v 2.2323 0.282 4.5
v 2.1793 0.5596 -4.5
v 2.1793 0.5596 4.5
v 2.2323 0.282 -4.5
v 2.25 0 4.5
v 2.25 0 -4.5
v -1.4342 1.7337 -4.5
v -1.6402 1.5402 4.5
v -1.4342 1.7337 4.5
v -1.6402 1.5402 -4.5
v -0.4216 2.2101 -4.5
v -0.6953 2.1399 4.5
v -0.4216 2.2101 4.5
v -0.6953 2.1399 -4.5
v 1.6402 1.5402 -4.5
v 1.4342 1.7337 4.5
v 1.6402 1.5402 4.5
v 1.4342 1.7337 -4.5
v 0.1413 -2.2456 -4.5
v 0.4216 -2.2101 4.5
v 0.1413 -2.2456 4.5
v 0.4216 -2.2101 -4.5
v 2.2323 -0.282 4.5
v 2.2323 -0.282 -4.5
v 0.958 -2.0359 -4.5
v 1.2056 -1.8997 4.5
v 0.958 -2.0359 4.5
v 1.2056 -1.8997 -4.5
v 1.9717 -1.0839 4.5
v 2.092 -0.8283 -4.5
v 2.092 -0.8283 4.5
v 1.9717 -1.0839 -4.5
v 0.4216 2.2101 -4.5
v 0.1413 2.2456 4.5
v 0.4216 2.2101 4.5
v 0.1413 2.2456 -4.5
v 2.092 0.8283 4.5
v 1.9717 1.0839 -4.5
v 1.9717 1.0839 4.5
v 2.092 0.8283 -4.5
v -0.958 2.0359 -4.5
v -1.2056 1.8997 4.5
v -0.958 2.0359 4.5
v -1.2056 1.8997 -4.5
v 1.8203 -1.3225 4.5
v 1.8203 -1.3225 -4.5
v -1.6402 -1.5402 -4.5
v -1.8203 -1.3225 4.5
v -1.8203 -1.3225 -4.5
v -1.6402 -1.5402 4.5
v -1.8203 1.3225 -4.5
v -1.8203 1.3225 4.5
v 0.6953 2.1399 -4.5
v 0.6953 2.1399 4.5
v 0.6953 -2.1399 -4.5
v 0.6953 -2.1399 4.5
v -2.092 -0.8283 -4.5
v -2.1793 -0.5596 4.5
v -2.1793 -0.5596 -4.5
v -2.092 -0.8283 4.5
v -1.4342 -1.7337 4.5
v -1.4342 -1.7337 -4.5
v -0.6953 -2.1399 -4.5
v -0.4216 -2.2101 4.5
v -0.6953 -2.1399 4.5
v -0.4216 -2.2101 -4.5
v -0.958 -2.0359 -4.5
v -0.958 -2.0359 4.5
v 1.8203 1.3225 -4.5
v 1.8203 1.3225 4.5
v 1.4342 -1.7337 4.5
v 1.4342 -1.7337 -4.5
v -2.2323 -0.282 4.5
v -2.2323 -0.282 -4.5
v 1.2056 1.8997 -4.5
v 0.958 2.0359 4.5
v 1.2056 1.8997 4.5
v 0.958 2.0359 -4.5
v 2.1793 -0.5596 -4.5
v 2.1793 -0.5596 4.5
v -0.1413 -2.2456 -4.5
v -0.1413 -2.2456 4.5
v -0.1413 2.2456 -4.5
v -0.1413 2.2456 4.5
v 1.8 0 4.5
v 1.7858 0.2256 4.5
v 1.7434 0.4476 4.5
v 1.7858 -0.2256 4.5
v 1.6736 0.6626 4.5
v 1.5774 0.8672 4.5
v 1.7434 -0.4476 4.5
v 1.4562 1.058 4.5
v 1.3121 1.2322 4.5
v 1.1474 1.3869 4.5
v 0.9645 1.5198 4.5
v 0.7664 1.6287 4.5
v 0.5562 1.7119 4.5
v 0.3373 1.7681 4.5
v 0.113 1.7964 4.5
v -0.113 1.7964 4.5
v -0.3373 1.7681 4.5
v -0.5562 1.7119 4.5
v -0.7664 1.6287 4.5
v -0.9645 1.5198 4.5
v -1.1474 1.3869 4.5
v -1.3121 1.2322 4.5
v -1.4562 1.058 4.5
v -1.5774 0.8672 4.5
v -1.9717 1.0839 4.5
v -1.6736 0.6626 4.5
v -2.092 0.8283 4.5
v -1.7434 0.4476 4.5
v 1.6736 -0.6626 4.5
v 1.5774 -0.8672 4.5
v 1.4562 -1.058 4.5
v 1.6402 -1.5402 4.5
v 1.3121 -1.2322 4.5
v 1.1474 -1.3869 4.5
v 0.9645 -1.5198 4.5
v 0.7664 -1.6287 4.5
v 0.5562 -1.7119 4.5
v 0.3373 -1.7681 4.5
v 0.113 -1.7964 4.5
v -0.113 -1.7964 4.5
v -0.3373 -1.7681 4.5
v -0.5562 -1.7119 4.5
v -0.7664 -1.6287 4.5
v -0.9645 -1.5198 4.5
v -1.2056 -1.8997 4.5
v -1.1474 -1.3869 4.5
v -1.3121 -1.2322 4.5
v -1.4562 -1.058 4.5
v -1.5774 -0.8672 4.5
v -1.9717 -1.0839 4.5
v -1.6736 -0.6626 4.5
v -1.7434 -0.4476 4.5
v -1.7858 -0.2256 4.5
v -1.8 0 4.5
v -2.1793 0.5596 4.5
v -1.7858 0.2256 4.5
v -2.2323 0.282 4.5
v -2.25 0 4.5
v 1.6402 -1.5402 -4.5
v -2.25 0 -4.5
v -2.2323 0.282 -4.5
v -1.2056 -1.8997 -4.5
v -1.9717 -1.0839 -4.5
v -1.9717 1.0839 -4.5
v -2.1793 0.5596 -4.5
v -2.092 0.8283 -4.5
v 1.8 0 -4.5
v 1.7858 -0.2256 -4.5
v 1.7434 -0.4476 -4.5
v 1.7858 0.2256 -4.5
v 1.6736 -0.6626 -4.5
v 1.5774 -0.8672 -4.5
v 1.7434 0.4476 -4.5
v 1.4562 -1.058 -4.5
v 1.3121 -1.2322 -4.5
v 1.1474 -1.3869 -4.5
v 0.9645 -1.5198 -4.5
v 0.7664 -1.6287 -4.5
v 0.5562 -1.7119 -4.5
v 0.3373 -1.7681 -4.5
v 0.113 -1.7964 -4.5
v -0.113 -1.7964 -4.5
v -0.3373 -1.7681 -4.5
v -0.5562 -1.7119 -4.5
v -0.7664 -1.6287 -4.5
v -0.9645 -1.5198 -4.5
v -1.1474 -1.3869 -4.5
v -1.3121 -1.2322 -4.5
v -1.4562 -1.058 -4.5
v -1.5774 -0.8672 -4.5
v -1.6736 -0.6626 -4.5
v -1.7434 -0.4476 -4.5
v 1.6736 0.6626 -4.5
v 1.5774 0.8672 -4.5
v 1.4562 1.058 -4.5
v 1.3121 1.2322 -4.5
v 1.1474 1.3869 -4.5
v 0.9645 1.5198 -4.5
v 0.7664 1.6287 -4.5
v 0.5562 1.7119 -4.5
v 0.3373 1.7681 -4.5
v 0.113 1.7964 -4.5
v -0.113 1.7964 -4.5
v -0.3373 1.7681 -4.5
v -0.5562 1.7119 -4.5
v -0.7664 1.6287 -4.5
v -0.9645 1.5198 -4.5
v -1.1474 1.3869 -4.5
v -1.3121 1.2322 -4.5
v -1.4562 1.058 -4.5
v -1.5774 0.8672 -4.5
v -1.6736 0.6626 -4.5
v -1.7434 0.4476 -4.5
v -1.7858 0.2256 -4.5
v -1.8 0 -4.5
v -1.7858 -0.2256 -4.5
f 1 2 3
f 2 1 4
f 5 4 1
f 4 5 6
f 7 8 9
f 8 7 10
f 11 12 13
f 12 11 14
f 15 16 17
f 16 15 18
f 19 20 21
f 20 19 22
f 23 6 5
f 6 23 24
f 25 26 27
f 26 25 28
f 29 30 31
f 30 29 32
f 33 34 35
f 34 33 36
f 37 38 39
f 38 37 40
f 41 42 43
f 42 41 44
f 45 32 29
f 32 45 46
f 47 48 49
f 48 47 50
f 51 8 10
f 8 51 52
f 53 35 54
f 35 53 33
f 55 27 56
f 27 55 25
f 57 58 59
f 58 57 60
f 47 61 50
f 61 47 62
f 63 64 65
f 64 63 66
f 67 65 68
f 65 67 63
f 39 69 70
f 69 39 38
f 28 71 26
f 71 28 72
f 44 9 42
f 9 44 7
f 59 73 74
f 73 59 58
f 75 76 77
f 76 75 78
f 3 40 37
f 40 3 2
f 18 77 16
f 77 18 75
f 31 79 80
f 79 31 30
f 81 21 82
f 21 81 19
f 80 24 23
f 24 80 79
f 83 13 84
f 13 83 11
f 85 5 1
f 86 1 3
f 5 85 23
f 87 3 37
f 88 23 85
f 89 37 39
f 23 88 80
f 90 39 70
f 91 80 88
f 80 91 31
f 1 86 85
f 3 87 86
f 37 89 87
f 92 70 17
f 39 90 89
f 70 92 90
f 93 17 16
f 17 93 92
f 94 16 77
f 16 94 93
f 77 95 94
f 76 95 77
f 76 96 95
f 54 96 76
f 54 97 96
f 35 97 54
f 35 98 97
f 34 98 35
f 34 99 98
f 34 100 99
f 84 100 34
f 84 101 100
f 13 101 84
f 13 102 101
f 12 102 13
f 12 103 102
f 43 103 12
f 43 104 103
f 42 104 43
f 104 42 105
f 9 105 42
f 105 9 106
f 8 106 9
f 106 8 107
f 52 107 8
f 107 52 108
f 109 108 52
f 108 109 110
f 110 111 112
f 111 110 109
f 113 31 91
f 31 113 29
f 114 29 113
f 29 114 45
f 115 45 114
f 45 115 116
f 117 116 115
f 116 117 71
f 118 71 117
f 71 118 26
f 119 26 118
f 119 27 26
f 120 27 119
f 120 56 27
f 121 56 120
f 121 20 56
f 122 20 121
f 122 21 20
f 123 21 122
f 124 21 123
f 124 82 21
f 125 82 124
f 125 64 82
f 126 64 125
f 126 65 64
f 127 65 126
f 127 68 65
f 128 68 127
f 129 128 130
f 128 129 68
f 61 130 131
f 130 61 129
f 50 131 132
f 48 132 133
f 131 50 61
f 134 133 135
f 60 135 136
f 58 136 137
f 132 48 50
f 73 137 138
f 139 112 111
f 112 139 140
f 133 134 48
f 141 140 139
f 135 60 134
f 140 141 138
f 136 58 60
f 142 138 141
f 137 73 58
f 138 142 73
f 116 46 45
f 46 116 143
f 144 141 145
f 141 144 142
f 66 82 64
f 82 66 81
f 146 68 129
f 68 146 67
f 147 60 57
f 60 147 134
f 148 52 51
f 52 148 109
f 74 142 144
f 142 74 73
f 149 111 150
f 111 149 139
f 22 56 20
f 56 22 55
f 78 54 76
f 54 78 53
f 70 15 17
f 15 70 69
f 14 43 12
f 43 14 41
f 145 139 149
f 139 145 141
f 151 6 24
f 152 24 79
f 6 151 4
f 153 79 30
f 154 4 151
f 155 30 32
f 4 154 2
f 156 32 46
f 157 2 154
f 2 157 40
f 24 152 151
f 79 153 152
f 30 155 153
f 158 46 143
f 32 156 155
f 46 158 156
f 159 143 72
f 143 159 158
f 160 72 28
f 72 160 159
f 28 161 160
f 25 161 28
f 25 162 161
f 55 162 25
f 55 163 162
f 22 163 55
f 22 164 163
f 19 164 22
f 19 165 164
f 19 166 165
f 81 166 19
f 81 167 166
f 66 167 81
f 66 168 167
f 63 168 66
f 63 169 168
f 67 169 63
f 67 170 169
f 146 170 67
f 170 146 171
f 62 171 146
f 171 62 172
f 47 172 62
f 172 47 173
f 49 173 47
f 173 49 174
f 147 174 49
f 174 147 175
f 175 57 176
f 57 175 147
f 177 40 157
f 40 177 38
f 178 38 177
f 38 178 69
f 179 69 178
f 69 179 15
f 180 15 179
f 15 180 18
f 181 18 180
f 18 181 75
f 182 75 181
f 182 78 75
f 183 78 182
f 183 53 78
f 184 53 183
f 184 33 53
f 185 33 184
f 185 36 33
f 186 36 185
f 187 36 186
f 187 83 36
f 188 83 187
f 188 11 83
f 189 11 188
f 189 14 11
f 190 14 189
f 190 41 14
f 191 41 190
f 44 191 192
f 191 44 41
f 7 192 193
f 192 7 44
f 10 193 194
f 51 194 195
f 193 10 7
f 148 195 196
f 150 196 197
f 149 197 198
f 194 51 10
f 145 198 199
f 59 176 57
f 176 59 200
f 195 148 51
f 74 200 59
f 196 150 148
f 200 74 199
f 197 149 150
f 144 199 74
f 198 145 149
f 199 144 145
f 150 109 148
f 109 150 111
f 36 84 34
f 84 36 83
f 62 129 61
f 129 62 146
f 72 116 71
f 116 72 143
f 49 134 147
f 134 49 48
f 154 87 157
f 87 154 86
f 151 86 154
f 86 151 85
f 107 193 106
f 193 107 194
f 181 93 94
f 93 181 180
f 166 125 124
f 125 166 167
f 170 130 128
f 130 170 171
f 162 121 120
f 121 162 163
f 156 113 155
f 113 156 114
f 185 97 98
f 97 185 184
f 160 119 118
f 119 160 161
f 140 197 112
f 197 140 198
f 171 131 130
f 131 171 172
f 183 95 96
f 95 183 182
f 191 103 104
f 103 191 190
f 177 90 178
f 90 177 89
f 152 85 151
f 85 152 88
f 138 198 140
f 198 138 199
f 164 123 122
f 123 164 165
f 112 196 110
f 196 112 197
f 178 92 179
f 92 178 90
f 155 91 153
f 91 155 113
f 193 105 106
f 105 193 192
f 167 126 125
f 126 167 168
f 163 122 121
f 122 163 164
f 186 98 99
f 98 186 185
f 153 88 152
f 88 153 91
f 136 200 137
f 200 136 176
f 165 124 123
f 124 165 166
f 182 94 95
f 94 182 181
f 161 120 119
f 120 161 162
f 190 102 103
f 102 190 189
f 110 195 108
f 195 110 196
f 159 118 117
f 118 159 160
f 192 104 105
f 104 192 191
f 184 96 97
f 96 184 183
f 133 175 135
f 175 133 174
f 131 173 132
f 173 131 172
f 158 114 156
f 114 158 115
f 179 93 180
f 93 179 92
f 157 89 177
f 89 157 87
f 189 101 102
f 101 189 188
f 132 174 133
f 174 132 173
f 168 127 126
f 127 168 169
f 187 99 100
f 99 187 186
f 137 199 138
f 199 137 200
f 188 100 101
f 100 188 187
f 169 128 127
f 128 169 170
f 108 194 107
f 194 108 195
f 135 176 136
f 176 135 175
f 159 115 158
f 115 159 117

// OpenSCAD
$fn = 50;


difference() {
	union() {
		translate(v = [0, 0, -4.5000000000]) {
			cylinder(h = 9, r = 2.2500000000);
		}
	}
	union() {
		#translate(v = [0, 0, -100.0000000000]) {
			cylinder(h = 200, r = 1.8000000000);
		}
	}
}
